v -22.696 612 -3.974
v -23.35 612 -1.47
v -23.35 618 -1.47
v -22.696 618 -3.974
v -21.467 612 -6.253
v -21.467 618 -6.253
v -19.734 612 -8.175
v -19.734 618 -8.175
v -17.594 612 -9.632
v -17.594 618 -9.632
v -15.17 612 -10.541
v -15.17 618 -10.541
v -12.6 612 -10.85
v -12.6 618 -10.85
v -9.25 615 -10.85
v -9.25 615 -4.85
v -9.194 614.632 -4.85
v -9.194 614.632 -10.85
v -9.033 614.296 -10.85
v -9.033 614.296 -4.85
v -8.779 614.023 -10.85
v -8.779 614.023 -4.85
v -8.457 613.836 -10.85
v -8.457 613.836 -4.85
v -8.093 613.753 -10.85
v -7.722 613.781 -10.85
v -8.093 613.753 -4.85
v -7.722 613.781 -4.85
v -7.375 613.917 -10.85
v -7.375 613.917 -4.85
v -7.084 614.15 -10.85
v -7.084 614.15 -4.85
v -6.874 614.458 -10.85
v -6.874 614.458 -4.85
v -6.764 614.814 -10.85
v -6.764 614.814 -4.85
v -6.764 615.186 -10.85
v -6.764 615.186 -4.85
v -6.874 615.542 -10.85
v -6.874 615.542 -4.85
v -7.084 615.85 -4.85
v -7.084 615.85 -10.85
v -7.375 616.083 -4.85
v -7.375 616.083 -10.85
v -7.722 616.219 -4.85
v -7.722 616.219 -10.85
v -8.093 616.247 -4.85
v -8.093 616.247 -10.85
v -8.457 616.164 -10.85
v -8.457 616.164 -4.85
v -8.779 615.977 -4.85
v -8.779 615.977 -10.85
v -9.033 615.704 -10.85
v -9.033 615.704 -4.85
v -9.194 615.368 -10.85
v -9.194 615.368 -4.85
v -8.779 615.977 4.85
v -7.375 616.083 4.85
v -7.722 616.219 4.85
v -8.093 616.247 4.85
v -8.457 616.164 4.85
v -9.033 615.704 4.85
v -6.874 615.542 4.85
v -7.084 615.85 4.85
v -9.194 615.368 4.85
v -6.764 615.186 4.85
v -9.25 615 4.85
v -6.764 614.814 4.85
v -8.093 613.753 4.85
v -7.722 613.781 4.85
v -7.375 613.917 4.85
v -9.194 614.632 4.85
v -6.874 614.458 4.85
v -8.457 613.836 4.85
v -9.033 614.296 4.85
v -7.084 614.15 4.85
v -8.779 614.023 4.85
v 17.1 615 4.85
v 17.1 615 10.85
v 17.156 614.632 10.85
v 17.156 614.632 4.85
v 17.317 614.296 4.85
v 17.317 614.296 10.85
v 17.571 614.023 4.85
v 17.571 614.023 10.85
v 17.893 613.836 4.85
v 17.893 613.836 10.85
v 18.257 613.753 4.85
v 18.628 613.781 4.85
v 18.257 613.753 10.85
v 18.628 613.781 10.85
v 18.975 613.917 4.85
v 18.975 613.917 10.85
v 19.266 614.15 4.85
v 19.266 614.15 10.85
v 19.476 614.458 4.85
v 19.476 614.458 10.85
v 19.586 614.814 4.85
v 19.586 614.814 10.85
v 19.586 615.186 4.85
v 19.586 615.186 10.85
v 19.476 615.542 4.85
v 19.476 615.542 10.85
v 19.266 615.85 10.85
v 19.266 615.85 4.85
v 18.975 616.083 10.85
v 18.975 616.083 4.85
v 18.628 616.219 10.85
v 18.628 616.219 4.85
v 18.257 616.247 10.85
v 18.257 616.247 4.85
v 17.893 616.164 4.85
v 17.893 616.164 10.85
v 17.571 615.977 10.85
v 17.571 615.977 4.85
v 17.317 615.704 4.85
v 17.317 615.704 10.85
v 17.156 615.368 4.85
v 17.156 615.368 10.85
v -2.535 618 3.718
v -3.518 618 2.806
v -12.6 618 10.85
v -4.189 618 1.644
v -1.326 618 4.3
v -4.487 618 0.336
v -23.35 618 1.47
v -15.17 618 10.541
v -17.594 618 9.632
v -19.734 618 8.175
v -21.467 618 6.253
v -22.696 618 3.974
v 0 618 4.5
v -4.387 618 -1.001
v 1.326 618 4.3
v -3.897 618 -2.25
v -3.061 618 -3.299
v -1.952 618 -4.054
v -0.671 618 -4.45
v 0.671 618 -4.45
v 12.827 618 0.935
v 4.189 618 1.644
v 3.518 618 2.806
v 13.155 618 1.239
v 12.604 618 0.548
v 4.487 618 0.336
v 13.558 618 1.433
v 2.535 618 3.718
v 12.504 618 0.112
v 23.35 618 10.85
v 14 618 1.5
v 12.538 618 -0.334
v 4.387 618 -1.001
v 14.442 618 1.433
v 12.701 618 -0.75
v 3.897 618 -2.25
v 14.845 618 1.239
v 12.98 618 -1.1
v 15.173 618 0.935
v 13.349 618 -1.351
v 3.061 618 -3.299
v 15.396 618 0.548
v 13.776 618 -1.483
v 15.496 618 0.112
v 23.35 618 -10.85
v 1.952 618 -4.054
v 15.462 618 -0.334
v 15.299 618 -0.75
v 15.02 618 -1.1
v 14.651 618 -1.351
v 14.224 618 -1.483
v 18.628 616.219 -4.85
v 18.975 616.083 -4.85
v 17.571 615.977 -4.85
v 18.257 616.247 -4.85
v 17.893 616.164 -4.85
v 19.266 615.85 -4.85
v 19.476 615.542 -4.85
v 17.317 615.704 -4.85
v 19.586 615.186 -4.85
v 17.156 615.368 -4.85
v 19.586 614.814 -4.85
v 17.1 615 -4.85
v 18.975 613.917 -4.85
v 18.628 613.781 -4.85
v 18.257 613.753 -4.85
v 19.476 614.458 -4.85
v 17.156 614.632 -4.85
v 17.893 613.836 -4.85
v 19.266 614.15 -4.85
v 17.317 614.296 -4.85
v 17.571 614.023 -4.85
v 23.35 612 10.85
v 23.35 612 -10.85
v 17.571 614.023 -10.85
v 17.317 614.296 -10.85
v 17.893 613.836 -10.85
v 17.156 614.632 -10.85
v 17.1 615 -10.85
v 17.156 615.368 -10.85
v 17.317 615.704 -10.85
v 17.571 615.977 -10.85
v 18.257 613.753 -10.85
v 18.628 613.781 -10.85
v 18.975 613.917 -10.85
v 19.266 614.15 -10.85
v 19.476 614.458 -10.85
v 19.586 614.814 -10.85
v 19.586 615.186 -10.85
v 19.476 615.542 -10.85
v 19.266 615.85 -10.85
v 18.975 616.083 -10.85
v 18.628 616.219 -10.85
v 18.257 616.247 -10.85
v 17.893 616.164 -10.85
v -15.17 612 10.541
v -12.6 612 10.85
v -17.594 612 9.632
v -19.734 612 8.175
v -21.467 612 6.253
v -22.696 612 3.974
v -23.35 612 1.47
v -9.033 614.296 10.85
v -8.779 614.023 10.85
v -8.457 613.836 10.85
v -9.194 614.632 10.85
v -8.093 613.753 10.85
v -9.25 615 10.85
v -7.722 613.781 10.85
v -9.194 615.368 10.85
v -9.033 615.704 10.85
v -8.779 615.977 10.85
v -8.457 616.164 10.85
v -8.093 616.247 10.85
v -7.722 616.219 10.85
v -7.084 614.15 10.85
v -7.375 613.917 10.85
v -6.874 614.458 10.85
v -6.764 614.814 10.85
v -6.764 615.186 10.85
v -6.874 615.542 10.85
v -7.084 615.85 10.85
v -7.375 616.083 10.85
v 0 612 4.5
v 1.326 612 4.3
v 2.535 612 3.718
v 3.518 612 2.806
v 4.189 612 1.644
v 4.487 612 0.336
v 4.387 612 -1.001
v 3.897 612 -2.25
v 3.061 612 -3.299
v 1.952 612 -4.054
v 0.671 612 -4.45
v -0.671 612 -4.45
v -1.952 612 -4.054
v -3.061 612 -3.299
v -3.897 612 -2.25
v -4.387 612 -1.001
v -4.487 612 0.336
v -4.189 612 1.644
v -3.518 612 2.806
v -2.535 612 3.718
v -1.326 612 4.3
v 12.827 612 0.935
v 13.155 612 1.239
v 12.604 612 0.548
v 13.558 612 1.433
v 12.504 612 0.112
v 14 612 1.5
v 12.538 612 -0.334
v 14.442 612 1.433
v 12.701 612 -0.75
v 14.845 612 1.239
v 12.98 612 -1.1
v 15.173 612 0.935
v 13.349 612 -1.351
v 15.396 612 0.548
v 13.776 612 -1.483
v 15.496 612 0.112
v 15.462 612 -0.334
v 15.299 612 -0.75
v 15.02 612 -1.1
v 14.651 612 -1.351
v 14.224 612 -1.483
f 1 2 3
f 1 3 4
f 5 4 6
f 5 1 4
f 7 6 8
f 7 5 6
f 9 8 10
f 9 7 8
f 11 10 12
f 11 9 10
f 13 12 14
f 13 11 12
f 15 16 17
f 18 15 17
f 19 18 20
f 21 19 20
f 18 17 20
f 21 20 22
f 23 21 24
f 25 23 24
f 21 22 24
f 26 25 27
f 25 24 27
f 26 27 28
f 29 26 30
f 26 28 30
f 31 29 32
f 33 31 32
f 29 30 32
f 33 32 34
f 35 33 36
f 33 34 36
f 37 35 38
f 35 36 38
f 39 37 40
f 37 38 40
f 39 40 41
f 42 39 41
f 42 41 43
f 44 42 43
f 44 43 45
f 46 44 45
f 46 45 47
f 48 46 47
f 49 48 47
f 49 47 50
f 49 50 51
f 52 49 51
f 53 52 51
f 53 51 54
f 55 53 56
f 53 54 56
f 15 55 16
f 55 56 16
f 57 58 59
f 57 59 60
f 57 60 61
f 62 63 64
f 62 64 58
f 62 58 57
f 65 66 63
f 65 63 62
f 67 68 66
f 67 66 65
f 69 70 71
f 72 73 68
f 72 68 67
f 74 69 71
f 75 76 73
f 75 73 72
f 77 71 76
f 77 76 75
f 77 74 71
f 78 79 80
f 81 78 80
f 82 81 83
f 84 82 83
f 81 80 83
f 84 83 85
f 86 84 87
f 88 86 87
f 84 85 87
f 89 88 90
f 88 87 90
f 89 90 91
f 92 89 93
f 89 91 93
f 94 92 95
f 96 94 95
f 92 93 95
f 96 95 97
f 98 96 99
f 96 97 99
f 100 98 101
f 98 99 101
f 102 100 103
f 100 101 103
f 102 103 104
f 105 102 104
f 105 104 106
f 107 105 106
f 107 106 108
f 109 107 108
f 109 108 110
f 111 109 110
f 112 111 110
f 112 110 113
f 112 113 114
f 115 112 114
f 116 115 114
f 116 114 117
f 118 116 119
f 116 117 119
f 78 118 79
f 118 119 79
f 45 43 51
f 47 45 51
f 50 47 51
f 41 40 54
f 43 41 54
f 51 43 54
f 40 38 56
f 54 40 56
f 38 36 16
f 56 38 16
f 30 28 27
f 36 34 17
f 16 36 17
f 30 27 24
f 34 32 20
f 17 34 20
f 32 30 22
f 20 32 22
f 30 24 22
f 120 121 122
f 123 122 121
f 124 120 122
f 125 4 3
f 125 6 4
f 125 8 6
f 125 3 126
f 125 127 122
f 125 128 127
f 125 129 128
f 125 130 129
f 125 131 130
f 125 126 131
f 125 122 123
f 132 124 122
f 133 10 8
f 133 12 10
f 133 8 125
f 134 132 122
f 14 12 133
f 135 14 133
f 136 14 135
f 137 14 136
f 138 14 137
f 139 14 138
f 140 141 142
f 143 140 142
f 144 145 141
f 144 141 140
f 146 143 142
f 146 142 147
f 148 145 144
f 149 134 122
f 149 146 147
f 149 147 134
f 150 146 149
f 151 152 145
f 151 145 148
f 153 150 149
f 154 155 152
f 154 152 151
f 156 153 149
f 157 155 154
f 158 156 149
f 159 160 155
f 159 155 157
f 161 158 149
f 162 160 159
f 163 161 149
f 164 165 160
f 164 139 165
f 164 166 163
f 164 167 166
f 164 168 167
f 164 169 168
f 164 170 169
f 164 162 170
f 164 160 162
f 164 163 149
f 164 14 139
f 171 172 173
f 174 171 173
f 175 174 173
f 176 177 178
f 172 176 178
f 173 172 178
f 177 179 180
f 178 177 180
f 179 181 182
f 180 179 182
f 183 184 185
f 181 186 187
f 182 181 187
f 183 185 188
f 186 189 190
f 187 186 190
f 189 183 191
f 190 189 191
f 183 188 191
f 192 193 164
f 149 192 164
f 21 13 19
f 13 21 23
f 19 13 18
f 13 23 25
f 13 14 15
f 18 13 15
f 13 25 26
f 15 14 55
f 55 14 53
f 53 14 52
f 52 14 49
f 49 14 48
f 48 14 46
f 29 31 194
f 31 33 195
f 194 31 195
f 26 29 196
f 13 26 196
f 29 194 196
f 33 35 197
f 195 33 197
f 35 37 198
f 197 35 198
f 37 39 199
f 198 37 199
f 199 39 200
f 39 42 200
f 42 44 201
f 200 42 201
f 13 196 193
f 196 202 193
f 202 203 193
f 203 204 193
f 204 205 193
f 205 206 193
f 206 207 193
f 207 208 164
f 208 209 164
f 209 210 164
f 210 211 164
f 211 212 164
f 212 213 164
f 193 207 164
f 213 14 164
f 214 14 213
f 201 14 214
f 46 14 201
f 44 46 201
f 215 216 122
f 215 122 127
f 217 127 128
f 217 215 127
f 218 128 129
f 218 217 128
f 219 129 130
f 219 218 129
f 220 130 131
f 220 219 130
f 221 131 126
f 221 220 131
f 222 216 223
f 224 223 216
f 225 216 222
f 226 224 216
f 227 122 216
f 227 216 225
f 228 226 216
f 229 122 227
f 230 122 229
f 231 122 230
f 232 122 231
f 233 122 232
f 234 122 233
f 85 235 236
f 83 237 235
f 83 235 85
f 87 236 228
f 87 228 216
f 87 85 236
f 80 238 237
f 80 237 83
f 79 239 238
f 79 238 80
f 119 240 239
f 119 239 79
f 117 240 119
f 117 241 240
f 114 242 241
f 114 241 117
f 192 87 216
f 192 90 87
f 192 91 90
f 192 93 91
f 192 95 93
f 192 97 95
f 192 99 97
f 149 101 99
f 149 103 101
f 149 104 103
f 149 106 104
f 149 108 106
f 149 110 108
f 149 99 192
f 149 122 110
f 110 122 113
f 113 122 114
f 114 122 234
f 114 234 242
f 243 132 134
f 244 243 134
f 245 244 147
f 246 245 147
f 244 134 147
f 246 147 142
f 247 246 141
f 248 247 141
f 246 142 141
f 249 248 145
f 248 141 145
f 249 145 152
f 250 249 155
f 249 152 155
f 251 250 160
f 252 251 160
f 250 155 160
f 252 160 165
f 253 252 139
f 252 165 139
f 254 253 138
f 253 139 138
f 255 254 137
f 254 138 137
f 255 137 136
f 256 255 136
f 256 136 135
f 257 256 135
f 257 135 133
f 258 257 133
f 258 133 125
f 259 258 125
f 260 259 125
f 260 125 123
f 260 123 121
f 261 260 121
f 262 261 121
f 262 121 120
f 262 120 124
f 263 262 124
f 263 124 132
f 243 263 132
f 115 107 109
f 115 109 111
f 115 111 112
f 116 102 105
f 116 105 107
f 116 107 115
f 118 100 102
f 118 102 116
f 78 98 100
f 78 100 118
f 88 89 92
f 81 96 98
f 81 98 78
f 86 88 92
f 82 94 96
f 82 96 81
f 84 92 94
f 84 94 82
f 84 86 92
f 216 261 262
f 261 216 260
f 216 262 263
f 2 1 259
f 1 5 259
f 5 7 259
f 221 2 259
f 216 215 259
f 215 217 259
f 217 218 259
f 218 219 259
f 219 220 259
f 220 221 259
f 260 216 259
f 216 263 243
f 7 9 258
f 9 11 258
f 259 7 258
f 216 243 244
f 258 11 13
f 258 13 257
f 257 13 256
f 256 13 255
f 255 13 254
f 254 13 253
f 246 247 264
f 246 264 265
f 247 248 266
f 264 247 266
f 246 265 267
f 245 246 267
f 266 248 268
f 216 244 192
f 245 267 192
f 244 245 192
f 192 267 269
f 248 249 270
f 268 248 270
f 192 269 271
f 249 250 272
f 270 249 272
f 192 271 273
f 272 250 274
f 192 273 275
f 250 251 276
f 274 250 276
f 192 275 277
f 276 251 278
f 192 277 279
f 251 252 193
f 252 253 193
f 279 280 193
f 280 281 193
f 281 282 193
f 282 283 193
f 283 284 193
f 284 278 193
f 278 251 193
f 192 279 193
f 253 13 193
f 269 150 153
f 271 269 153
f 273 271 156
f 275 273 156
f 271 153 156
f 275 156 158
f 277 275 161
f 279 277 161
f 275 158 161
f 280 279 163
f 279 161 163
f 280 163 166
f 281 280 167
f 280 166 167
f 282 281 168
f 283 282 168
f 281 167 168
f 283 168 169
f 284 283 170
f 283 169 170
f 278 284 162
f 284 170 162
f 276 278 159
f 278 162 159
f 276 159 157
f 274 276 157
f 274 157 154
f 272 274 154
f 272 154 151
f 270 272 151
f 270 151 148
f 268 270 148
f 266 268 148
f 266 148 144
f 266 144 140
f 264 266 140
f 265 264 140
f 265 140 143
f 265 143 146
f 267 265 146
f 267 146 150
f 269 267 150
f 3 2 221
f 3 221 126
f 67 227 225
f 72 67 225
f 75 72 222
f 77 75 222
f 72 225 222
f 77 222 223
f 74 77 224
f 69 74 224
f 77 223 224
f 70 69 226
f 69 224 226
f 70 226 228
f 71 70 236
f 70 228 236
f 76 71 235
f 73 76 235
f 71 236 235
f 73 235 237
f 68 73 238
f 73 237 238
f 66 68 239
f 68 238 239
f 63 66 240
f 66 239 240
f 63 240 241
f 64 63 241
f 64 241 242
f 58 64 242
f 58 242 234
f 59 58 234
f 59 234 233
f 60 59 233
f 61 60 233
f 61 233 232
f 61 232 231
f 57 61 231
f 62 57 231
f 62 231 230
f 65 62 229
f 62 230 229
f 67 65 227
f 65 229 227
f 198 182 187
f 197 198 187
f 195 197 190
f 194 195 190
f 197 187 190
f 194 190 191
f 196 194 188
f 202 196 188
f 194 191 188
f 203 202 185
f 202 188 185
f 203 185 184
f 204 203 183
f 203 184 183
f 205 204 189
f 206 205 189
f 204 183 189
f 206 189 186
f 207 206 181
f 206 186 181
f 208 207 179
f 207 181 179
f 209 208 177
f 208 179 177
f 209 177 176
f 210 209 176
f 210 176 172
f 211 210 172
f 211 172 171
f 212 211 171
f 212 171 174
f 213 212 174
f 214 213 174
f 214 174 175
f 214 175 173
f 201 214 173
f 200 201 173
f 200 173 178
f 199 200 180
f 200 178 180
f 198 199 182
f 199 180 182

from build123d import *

# Parameters (mm, degrees)
AUFSATZ_LINEAR_AUSTRAGEN1_DEPTH      = 10.85
AUFSATZ_LINEAR_AUSTRAGEN1_DEPTH_BACK = 10.85
SKIZZE3_W                            = 46.7
SKIZZE3_H                            = 6
SCHNITT_LINEAR_START                 = 618
SKIZZE4_R                            = 4.5
SKIZZE4_R_2                          = 1.5
SCHNITT_LINEAR_AUSTRAGEN1_DEPTH      = 10
SCHNITT_LINEAR_START_2               = 10.85
SKIZZE6_R                            = 1.25
SCHNITT_LINEAR_AUSTRAGEN2_DEPTH      = 6
SCHNITT_LINEAR_START_3               = -4.85
SKIZZE6_2_R                          = 1.25
SCHNITT_LINEAR_AUSTRAGEN3_DEPTH      = 6
SCHNITT_LINEAR_START_4               = 612
SCHNITT_LINEAR_AUSTRAGEN4_DEPTH      = 6


# Read off the part's stored shape, not the designer's step: Schnitt-Linear austragen4
with BuildPart() as part:
    # Skizze3 → Aufsatz-Linear austragen1 (new, two sides: drawn at the far end of the back side and taken through both)
    with BuildSketch(Plane.XY.offset(-AUFSATZ_LINEAR_AUSTRAGEN1_DEPTH_BACK)):
        with Locations((0, 615)):
            Rectangle(SKIZZE3_W, SKIZZE3_H)
    extrude(amount=AUFSATZ_LINEAR_AUSTRAGEN1_DEPTH + AUFSATZ_LINEAR_AUSTRAGEN1_DEPTH_BACK)

    # Skizze4 → Schnitt-Linear austragen1 (cut)
    with BuildSketch(Plane(origin=(0, 0, 0), x_dir=(1, 0, 0), z_dir=(0, 1, 0)).offset(SCHNITT_LINEAR_START)):
        with Locations(Location((0, 0, 0), (0, 0, 270))):
            Circle(SKIZZE4_R)
        with Locations(Location((14, 0, 0), (0, 0, 270))):
            Circle(SKIZZE4_R_2)
    extrude(amount=-SCHNITT_LINEAR_AUSTRAGEN1_DEPTH, mode=Mode.SUBTRACT)

    # Skizze6 → Schnitt-Linear austragen2 (cut)
    with BuildSketch(Plane.XY.offset(SCHNITT_LINEAR_START_2)):
        with Locations(Location((18.35, 615, 0), (0, 0, 180))):
            Circle(SKIZZE6_R)
        with Locations(Location((-8, 615, 0), (0, 0, 180))):
            Circle(SKIZZE6_R)
    extrude(amount=-SCHNITT_LINEAR_AUSTRAGEN2_DEPTH, mode=Mode.SUBTRACT)

    # Skizze6<2> → Schnitt-Linear austragen3 (cut)
    with BuildSketch(Plane.XY.offset(SCHNITT_LINEAR_START_3)):
        with Locations((18.35, 234)):
            Circle(SKIZZE6_2_R)
        with Locations((-8, 234)):
            Circle(SKIZZE6_2_R)
        with Locations(Location((18.35, 615, 0), (0, 0, 180))):
            Circle(SKIZZE6_2_R)
        with Locations(Location((-8, 615, 0), (0, 0, 180))):
            Circle(SKIZZE6_2_R)
    extrude(amount=-SCHNITT_LINEAR_AUSTRAGEN3_DEPTH, mode=Mode.SUBTRACT)

    # Schnitt-Linear austragen4 outline → Schnitt-Linear austragen4 (cut)
    with BuildSketch(Plane(origin=(0, 0, 0), x_dir=(1, 0, 0), z_dir=(0, 1, 0)).offset(SCHNITT_LINEAR_START_4)):
        with BuildLine():
            Line((-23.35, 10.85), (-23.35, 1.469693846))
            ThreePointArc((-23.35, 1.469693846), (-19.733593827, 8.17522716), (-12.6, 10.85))
            Line((-12.6, 10.85), (-23.35, 10.85))
        make_face()
        with BuildLine():
            ThreePointArc((-12.6, -10.85), (-19.733593827, -8.17522716), (-23.35, -1.469693846))
            Line((-23.35, -1.469693846), (-23.35, -10.85))
            Line((-23.35, -10.85), (-12.6, -10.85))
        make_face()
    extrude(amount=SCHNITT_LINEAR_AUSTRAGEN4_DEPTH, mode=Mode.SUBTRACT)


solid = part.part
